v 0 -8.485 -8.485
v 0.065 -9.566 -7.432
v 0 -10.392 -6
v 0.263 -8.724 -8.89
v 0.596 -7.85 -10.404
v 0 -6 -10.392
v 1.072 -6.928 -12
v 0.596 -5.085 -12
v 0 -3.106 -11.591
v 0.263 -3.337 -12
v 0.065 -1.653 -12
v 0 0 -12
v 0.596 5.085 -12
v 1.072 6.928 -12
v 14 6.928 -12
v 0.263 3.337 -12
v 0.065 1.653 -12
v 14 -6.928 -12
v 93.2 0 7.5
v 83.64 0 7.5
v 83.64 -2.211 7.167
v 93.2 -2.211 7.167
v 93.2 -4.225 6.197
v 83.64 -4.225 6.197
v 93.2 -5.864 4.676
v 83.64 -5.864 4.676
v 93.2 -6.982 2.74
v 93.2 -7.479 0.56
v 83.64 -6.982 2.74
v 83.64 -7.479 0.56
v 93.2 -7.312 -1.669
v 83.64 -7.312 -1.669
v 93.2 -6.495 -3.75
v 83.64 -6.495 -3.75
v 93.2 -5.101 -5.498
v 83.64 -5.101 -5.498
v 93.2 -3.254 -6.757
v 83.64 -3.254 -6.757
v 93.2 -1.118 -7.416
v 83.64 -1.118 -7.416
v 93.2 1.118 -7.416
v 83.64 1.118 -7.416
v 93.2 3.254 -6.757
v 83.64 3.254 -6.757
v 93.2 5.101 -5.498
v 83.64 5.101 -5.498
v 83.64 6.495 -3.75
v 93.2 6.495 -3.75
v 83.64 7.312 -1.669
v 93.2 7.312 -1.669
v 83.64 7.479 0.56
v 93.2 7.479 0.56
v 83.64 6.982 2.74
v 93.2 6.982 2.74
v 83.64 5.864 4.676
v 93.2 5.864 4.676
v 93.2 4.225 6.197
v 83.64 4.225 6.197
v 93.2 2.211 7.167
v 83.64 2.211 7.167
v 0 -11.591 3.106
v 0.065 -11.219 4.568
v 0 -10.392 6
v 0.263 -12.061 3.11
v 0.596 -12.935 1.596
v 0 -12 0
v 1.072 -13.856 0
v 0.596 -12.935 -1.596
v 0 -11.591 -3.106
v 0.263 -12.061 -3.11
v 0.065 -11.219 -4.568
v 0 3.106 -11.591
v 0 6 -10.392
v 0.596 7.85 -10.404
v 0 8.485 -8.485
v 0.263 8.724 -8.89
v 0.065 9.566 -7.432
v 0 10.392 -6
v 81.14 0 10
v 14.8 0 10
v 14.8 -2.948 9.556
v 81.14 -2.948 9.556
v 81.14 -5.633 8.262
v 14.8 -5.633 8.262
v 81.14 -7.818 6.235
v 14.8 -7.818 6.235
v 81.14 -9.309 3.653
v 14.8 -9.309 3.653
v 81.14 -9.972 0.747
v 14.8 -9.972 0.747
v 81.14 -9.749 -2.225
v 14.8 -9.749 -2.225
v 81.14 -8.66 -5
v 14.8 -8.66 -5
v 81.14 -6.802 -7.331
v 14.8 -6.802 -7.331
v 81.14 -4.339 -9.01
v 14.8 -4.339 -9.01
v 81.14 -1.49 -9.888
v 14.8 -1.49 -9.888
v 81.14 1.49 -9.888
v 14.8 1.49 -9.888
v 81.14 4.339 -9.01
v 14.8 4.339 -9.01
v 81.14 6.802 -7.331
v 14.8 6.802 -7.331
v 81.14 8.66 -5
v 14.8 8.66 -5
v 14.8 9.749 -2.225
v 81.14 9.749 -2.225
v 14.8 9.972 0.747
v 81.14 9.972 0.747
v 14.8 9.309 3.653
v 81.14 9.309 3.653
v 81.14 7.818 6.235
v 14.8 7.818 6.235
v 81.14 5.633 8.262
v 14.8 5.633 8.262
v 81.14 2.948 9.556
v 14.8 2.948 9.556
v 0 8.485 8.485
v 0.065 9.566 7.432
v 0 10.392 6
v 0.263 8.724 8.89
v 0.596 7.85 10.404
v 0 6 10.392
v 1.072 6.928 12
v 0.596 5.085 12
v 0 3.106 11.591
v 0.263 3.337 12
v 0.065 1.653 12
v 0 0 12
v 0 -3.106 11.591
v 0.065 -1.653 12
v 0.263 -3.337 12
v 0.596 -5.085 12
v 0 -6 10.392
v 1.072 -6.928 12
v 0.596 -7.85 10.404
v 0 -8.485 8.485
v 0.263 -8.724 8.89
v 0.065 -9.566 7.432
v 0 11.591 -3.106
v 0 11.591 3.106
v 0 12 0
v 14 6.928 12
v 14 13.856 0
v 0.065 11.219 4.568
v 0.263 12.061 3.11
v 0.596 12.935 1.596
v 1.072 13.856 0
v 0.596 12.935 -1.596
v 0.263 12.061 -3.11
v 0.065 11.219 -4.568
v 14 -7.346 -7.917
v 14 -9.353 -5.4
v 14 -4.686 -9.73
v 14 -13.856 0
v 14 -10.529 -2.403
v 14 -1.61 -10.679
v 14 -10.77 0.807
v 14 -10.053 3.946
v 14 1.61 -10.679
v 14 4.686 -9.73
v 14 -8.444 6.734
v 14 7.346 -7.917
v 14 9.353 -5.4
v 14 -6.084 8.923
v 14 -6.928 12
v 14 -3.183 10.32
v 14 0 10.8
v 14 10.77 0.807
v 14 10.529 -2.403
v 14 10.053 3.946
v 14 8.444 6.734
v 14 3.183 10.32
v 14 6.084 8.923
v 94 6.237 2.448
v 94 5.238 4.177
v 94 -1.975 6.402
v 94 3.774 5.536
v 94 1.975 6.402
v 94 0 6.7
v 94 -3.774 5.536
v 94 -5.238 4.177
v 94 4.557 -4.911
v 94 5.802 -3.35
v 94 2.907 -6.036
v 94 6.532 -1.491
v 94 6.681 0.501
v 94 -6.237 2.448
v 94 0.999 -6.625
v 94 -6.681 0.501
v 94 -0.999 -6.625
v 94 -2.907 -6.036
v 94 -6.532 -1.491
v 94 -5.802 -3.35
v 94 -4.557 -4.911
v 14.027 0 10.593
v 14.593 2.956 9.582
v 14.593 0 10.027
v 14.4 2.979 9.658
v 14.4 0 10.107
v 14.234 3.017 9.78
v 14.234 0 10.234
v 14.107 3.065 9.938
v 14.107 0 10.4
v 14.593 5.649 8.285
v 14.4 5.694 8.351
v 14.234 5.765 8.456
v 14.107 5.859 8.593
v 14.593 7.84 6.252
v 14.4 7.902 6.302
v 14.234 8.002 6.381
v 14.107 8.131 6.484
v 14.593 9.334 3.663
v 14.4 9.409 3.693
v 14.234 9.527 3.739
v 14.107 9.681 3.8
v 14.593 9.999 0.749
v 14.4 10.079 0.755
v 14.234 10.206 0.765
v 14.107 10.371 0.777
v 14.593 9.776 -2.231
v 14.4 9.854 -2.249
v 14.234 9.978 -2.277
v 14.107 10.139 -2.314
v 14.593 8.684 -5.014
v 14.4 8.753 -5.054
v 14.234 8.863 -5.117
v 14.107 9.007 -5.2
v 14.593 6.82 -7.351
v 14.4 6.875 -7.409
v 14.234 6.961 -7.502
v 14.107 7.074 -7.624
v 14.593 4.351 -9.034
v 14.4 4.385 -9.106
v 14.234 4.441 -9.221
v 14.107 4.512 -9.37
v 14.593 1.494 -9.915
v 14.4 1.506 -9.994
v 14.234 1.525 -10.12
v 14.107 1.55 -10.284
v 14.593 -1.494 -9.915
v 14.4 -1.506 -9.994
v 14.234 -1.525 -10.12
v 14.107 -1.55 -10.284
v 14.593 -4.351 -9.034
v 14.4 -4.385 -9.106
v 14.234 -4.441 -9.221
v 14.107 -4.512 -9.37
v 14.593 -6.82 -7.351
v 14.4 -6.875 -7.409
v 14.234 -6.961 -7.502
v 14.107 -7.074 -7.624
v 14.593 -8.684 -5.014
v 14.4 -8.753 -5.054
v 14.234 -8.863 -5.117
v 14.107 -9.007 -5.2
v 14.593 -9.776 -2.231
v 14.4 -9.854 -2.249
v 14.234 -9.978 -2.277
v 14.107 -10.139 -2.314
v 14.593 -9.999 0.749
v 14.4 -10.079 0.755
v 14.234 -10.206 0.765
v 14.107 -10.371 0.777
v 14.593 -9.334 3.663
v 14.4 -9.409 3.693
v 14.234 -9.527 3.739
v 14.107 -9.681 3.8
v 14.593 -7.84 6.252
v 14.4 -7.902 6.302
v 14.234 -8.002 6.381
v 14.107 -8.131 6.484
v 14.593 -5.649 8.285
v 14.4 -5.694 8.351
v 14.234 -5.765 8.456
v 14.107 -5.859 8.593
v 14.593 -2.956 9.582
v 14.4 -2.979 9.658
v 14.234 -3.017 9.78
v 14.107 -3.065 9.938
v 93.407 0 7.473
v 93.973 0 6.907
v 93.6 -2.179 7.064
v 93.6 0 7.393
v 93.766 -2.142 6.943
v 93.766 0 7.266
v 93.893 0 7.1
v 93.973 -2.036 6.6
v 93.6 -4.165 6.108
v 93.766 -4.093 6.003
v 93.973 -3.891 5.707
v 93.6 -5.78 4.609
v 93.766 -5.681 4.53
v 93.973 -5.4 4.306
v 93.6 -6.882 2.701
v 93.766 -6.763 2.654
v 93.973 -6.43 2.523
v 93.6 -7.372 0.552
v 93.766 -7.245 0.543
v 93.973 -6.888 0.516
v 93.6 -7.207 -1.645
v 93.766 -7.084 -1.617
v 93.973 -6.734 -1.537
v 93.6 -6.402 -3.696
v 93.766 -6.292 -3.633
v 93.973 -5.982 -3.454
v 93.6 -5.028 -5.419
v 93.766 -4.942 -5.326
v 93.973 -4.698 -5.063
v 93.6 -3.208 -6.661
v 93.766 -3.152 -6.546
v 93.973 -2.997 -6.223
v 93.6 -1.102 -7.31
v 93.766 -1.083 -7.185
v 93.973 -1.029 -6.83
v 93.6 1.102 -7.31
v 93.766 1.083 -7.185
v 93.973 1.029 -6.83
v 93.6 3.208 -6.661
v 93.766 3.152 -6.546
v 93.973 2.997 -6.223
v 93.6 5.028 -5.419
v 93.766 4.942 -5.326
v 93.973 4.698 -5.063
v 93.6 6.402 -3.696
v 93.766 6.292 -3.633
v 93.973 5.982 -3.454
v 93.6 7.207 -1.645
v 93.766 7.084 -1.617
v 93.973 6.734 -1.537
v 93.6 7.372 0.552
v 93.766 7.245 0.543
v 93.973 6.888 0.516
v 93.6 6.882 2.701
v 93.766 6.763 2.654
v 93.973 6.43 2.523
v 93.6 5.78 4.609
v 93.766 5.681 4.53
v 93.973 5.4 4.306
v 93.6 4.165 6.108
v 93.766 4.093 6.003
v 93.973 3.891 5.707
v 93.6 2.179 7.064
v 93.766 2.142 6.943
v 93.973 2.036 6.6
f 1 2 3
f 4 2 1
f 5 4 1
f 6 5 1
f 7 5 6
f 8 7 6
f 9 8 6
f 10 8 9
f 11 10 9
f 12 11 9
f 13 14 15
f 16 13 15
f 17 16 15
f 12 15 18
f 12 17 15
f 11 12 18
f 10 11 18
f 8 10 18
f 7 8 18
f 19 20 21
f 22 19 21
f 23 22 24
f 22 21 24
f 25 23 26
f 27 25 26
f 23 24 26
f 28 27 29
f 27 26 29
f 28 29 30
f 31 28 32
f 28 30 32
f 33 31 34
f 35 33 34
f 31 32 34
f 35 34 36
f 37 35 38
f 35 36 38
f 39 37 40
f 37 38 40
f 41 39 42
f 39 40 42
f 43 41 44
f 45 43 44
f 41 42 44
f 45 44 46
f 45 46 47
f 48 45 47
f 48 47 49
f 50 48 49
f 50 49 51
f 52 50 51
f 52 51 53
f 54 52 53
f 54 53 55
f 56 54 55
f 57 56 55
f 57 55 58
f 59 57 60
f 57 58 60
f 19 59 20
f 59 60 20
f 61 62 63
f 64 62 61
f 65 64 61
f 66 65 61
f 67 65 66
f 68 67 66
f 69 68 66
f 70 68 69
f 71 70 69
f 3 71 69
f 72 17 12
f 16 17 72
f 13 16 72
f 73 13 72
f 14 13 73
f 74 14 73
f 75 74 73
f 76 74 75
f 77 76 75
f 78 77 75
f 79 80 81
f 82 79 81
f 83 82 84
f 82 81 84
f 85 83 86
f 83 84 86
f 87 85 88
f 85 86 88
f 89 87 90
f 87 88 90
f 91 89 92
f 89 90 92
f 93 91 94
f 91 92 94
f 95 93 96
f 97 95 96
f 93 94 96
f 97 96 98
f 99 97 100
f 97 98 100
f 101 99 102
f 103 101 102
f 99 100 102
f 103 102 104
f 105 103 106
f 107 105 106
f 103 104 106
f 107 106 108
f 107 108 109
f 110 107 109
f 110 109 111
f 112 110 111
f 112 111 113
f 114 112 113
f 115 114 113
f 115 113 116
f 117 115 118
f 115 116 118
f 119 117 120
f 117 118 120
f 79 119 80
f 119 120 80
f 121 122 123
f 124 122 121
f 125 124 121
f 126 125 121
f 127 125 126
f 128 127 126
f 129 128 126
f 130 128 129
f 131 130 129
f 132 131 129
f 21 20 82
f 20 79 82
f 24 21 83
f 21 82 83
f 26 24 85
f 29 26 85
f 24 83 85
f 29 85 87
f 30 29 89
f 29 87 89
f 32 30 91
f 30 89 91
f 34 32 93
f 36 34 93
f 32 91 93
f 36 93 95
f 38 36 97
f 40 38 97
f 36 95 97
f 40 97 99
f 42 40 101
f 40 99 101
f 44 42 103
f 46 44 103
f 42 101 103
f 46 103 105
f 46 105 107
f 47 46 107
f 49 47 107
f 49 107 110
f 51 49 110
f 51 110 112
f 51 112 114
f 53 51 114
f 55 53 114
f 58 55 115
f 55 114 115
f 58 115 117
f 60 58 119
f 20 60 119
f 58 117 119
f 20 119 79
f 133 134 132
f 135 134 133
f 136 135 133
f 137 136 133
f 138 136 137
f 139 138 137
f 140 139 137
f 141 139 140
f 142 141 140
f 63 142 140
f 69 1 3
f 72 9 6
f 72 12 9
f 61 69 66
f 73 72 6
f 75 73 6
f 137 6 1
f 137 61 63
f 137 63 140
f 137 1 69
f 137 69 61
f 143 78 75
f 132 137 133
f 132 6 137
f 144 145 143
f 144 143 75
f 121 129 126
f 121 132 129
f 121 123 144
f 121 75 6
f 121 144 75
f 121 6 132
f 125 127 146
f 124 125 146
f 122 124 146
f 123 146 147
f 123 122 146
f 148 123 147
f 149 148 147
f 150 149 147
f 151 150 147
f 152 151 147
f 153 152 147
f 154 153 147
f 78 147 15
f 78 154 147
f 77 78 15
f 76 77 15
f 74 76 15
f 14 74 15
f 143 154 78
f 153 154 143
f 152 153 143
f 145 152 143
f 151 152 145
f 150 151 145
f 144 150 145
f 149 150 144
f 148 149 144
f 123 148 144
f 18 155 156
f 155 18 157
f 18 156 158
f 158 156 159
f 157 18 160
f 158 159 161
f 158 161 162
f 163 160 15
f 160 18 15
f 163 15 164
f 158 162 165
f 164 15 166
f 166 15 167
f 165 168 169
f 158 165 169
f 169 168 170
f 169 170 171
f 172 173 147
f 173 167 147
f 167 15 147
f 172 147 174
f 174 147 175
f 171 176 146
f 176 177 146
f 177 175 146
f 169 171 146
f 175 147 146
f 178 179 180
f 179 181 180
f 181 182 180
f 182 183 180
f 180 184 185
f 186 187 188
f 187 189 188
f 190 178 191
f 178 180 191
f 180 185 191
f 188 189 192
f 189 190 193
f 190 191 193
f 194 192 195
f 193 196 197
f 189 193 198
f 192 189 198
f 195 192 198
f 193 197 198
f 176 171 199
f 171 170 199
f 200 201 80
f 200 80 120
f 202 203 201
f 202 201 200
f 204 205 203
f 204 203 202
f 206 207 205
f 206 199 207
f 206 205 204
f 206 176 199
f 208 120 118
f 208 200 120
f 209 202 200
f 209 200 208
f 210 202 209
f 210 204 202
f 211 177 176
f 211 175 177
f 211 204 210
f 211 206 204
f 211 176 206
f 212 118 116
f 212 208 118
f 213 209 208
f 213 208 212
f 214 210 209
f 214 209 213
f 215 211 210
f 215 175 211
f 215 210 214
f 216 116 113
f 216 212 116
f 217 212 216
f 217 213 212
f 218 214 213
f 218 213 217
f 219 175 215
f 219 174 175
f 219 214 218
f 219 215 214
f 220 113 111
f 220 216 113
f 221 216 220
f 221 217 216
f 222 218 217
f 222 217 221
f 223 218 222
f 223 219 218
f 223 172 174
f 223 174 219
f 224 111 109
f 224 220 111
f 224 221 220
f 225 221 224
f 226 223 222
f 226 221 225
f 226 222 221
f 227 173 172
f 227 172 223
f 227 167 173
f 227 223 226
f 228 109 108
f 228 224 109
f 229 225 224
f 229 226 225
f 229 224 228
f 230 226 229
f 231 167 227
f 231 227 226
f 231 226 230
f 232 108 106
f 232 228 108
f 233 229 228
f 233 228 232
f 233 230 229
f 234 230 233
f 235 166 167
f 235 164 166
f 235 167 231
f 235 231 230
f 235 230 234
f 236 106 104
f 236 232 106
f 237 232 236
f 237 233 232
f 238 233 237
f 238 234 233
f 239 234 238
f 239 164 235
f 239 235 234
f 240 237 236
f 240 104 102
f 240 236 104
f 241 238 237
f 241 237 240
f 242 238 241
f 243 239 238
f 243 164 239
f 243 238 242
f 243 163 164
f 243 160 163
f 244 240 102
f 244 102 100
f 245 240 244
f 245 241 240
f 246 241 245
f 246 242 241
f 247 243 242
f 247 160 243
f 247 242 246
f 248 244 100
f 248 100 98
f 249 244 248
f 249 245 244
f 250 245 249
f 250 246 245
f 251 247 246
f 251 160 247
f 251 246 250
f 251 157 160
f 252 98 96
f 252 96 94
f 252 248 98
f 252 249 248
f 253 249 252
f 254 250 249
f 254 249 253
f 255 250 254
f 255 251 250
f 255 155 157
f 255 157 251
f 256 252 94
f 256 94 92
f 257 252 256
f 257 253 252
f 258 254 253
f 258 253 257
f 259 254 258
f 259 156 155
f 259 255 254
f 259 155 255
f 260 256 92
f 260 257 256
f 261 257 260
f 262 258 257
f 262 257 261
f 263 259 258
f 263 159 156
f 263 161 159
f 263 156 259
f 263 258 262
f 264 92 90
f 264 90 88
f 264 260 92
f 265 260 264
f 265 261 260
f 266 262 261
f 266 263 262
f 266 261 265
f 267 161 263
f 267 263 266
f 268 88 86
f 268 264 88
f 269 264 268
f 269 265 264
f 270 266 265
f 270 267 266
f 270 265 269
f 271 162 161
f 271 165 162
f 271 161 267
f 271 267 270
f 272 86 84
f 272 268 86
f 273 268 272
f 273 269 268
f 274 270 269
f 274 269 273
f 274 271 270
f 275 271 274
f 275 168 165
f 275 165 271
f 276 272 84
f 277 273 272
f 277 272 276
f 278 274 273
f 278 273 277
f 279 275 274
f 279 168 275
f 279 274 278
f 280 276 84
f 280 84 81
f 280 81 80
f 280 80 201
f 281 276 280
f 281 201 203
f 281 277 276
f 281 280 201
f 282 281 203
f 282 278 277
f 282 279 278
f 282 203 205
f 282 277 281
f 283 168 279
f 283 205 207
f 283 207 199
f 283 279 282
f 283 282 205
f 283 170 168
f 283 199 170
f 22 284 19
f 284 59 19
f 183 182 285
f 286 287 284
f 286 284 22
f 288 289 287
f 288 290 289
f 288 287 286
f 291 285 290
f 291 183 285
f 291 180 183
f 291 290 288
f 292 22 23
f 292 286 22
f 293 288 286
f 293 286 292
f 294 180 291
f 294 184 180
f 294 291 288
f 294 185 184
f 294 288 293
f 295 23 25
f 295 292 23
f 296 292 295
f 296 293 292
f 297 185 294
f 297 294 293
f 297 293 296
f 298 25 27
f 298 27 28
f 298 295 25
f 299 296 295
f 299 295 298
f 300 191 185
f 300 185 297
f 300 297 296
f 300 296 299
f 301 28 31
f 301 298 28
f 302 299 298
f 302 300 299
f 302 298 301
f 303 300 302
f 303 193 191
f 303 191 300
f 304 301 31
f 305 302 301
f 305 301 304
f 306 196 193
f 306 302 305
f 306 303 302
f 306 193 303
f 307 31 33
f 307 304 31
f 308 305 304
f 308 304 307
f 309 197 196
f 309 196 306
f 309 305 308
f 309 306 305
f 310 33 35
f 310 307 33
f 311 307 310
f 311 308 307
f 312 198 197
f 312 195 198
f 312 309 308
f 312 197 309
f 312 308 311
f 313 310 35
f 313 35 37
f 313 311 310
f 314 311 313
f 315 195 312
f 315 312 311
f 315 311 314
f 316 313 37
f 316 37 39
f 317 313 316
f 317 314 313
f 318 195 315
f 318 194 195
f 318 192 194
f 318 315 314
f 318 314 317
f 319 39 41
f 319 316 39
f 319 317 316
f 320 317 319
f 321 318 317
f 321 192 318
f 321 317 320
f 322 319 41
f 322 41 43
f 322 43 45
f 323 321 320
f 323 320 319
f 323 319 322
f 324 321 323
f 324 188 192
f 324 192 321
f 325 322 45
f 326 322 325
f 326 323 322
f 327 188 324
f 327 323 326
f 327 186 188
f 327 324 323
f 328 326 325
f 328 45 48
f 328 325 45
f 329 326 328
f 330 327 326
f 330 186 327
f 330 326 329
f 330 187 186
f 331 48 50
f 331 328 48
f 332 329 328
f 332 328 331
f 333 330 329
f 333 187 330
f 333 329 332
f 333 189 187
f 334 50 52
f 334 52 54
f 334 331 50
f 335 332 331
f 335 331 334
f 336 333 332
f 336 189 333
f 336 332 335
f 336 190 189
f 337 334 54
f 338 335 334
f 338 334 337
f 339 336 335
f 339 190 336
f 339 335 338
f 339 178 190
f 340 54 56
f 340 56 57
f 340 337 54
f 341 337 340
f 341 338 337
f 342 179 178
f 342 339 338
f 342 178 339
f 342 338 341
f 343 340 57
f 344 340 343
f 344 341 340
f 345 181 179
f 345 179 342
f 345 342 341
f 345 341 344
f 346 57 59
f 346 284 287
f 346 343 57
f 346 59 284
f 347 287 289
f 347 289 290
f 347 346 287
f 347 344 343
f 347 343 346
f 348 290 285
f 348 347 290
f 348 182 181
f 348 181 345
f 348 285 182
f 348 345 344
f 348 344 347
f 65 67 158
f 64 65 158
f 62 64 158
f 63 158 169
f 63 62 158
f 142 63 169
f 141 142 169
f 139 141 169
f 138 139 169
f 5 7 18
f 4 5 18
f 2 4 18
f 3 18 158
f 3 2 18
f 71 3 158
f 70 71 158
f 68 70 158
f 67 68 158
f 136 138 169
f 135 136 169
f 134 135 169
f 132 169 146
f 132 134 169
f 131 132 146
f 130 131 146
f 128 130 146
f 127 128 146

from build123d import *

# Parameters (mm, degrees)
BASEHEAD_DEPTH   = 14
HEADFILLET_R     = 0.8
BASEBODYFILLET_R = 0.8


with BuildPart() as part:
    # HexSke → BaseHead (new body)
    with BuildSketch(Plane(origin=(0, 0, 0), x_dir=(0, 0, -1), z_dir=(1, 0, 0))):
        Polygon((12, 6.92820323), (12, -6.92820323), (0, -13.856406461), (-12, -6.92820323), (-12, 6.92820323), (0, 13.856406461), align=None)
    extrude(amount=BASEHEAD_DEPTH)

    # BodySke → BaseBody (revolve)
    with BuildSketch(Plane.XY, mode=Mode.PRIVATE) as basebody_sk:
        Polygon((0, 0), (94, 0), (94, 7.5), (83.64, 7.5), (81.14, 10), (0, 10), align=None)
    revolve(basebody_sk.sketch.rotate(Axis((0, 0, 0), (1, 0, 0)), 90), axis=Axis((0, 0, 0), (1, 0, 0)))

    # HeadChamSke → HeadChamfer (revolve, cut)
    with BuildSketch(Plane.XY):
        Polygon((0, 12), (3.958548116, 18.856406461), (3.958548116, 23.856406461), (-10, 23.856406461), (-10, 12), align=None)
    revolve(axis=Axis((0, 0, 0), (1, 0, 0)), mode=Mode.SUBTRACT)

    # HeadFillet
    headfillet_edges = [part.edges().sort_by_distance(p)[0] for p in [
        (14, 0, -10),
    ]]
    fillet(headfillet_edges, radius=HEADFILLET_R)

    # BaseBodyFillet
    basebodyfillet_edges = [part.edges().sort_by_distance(p)[0] for p in [
        (94, 0, -7.5),
    ]]
    fillet(basebodyfillet_edges, radius=BASEBODYFILLET_R)


solid = part.part
